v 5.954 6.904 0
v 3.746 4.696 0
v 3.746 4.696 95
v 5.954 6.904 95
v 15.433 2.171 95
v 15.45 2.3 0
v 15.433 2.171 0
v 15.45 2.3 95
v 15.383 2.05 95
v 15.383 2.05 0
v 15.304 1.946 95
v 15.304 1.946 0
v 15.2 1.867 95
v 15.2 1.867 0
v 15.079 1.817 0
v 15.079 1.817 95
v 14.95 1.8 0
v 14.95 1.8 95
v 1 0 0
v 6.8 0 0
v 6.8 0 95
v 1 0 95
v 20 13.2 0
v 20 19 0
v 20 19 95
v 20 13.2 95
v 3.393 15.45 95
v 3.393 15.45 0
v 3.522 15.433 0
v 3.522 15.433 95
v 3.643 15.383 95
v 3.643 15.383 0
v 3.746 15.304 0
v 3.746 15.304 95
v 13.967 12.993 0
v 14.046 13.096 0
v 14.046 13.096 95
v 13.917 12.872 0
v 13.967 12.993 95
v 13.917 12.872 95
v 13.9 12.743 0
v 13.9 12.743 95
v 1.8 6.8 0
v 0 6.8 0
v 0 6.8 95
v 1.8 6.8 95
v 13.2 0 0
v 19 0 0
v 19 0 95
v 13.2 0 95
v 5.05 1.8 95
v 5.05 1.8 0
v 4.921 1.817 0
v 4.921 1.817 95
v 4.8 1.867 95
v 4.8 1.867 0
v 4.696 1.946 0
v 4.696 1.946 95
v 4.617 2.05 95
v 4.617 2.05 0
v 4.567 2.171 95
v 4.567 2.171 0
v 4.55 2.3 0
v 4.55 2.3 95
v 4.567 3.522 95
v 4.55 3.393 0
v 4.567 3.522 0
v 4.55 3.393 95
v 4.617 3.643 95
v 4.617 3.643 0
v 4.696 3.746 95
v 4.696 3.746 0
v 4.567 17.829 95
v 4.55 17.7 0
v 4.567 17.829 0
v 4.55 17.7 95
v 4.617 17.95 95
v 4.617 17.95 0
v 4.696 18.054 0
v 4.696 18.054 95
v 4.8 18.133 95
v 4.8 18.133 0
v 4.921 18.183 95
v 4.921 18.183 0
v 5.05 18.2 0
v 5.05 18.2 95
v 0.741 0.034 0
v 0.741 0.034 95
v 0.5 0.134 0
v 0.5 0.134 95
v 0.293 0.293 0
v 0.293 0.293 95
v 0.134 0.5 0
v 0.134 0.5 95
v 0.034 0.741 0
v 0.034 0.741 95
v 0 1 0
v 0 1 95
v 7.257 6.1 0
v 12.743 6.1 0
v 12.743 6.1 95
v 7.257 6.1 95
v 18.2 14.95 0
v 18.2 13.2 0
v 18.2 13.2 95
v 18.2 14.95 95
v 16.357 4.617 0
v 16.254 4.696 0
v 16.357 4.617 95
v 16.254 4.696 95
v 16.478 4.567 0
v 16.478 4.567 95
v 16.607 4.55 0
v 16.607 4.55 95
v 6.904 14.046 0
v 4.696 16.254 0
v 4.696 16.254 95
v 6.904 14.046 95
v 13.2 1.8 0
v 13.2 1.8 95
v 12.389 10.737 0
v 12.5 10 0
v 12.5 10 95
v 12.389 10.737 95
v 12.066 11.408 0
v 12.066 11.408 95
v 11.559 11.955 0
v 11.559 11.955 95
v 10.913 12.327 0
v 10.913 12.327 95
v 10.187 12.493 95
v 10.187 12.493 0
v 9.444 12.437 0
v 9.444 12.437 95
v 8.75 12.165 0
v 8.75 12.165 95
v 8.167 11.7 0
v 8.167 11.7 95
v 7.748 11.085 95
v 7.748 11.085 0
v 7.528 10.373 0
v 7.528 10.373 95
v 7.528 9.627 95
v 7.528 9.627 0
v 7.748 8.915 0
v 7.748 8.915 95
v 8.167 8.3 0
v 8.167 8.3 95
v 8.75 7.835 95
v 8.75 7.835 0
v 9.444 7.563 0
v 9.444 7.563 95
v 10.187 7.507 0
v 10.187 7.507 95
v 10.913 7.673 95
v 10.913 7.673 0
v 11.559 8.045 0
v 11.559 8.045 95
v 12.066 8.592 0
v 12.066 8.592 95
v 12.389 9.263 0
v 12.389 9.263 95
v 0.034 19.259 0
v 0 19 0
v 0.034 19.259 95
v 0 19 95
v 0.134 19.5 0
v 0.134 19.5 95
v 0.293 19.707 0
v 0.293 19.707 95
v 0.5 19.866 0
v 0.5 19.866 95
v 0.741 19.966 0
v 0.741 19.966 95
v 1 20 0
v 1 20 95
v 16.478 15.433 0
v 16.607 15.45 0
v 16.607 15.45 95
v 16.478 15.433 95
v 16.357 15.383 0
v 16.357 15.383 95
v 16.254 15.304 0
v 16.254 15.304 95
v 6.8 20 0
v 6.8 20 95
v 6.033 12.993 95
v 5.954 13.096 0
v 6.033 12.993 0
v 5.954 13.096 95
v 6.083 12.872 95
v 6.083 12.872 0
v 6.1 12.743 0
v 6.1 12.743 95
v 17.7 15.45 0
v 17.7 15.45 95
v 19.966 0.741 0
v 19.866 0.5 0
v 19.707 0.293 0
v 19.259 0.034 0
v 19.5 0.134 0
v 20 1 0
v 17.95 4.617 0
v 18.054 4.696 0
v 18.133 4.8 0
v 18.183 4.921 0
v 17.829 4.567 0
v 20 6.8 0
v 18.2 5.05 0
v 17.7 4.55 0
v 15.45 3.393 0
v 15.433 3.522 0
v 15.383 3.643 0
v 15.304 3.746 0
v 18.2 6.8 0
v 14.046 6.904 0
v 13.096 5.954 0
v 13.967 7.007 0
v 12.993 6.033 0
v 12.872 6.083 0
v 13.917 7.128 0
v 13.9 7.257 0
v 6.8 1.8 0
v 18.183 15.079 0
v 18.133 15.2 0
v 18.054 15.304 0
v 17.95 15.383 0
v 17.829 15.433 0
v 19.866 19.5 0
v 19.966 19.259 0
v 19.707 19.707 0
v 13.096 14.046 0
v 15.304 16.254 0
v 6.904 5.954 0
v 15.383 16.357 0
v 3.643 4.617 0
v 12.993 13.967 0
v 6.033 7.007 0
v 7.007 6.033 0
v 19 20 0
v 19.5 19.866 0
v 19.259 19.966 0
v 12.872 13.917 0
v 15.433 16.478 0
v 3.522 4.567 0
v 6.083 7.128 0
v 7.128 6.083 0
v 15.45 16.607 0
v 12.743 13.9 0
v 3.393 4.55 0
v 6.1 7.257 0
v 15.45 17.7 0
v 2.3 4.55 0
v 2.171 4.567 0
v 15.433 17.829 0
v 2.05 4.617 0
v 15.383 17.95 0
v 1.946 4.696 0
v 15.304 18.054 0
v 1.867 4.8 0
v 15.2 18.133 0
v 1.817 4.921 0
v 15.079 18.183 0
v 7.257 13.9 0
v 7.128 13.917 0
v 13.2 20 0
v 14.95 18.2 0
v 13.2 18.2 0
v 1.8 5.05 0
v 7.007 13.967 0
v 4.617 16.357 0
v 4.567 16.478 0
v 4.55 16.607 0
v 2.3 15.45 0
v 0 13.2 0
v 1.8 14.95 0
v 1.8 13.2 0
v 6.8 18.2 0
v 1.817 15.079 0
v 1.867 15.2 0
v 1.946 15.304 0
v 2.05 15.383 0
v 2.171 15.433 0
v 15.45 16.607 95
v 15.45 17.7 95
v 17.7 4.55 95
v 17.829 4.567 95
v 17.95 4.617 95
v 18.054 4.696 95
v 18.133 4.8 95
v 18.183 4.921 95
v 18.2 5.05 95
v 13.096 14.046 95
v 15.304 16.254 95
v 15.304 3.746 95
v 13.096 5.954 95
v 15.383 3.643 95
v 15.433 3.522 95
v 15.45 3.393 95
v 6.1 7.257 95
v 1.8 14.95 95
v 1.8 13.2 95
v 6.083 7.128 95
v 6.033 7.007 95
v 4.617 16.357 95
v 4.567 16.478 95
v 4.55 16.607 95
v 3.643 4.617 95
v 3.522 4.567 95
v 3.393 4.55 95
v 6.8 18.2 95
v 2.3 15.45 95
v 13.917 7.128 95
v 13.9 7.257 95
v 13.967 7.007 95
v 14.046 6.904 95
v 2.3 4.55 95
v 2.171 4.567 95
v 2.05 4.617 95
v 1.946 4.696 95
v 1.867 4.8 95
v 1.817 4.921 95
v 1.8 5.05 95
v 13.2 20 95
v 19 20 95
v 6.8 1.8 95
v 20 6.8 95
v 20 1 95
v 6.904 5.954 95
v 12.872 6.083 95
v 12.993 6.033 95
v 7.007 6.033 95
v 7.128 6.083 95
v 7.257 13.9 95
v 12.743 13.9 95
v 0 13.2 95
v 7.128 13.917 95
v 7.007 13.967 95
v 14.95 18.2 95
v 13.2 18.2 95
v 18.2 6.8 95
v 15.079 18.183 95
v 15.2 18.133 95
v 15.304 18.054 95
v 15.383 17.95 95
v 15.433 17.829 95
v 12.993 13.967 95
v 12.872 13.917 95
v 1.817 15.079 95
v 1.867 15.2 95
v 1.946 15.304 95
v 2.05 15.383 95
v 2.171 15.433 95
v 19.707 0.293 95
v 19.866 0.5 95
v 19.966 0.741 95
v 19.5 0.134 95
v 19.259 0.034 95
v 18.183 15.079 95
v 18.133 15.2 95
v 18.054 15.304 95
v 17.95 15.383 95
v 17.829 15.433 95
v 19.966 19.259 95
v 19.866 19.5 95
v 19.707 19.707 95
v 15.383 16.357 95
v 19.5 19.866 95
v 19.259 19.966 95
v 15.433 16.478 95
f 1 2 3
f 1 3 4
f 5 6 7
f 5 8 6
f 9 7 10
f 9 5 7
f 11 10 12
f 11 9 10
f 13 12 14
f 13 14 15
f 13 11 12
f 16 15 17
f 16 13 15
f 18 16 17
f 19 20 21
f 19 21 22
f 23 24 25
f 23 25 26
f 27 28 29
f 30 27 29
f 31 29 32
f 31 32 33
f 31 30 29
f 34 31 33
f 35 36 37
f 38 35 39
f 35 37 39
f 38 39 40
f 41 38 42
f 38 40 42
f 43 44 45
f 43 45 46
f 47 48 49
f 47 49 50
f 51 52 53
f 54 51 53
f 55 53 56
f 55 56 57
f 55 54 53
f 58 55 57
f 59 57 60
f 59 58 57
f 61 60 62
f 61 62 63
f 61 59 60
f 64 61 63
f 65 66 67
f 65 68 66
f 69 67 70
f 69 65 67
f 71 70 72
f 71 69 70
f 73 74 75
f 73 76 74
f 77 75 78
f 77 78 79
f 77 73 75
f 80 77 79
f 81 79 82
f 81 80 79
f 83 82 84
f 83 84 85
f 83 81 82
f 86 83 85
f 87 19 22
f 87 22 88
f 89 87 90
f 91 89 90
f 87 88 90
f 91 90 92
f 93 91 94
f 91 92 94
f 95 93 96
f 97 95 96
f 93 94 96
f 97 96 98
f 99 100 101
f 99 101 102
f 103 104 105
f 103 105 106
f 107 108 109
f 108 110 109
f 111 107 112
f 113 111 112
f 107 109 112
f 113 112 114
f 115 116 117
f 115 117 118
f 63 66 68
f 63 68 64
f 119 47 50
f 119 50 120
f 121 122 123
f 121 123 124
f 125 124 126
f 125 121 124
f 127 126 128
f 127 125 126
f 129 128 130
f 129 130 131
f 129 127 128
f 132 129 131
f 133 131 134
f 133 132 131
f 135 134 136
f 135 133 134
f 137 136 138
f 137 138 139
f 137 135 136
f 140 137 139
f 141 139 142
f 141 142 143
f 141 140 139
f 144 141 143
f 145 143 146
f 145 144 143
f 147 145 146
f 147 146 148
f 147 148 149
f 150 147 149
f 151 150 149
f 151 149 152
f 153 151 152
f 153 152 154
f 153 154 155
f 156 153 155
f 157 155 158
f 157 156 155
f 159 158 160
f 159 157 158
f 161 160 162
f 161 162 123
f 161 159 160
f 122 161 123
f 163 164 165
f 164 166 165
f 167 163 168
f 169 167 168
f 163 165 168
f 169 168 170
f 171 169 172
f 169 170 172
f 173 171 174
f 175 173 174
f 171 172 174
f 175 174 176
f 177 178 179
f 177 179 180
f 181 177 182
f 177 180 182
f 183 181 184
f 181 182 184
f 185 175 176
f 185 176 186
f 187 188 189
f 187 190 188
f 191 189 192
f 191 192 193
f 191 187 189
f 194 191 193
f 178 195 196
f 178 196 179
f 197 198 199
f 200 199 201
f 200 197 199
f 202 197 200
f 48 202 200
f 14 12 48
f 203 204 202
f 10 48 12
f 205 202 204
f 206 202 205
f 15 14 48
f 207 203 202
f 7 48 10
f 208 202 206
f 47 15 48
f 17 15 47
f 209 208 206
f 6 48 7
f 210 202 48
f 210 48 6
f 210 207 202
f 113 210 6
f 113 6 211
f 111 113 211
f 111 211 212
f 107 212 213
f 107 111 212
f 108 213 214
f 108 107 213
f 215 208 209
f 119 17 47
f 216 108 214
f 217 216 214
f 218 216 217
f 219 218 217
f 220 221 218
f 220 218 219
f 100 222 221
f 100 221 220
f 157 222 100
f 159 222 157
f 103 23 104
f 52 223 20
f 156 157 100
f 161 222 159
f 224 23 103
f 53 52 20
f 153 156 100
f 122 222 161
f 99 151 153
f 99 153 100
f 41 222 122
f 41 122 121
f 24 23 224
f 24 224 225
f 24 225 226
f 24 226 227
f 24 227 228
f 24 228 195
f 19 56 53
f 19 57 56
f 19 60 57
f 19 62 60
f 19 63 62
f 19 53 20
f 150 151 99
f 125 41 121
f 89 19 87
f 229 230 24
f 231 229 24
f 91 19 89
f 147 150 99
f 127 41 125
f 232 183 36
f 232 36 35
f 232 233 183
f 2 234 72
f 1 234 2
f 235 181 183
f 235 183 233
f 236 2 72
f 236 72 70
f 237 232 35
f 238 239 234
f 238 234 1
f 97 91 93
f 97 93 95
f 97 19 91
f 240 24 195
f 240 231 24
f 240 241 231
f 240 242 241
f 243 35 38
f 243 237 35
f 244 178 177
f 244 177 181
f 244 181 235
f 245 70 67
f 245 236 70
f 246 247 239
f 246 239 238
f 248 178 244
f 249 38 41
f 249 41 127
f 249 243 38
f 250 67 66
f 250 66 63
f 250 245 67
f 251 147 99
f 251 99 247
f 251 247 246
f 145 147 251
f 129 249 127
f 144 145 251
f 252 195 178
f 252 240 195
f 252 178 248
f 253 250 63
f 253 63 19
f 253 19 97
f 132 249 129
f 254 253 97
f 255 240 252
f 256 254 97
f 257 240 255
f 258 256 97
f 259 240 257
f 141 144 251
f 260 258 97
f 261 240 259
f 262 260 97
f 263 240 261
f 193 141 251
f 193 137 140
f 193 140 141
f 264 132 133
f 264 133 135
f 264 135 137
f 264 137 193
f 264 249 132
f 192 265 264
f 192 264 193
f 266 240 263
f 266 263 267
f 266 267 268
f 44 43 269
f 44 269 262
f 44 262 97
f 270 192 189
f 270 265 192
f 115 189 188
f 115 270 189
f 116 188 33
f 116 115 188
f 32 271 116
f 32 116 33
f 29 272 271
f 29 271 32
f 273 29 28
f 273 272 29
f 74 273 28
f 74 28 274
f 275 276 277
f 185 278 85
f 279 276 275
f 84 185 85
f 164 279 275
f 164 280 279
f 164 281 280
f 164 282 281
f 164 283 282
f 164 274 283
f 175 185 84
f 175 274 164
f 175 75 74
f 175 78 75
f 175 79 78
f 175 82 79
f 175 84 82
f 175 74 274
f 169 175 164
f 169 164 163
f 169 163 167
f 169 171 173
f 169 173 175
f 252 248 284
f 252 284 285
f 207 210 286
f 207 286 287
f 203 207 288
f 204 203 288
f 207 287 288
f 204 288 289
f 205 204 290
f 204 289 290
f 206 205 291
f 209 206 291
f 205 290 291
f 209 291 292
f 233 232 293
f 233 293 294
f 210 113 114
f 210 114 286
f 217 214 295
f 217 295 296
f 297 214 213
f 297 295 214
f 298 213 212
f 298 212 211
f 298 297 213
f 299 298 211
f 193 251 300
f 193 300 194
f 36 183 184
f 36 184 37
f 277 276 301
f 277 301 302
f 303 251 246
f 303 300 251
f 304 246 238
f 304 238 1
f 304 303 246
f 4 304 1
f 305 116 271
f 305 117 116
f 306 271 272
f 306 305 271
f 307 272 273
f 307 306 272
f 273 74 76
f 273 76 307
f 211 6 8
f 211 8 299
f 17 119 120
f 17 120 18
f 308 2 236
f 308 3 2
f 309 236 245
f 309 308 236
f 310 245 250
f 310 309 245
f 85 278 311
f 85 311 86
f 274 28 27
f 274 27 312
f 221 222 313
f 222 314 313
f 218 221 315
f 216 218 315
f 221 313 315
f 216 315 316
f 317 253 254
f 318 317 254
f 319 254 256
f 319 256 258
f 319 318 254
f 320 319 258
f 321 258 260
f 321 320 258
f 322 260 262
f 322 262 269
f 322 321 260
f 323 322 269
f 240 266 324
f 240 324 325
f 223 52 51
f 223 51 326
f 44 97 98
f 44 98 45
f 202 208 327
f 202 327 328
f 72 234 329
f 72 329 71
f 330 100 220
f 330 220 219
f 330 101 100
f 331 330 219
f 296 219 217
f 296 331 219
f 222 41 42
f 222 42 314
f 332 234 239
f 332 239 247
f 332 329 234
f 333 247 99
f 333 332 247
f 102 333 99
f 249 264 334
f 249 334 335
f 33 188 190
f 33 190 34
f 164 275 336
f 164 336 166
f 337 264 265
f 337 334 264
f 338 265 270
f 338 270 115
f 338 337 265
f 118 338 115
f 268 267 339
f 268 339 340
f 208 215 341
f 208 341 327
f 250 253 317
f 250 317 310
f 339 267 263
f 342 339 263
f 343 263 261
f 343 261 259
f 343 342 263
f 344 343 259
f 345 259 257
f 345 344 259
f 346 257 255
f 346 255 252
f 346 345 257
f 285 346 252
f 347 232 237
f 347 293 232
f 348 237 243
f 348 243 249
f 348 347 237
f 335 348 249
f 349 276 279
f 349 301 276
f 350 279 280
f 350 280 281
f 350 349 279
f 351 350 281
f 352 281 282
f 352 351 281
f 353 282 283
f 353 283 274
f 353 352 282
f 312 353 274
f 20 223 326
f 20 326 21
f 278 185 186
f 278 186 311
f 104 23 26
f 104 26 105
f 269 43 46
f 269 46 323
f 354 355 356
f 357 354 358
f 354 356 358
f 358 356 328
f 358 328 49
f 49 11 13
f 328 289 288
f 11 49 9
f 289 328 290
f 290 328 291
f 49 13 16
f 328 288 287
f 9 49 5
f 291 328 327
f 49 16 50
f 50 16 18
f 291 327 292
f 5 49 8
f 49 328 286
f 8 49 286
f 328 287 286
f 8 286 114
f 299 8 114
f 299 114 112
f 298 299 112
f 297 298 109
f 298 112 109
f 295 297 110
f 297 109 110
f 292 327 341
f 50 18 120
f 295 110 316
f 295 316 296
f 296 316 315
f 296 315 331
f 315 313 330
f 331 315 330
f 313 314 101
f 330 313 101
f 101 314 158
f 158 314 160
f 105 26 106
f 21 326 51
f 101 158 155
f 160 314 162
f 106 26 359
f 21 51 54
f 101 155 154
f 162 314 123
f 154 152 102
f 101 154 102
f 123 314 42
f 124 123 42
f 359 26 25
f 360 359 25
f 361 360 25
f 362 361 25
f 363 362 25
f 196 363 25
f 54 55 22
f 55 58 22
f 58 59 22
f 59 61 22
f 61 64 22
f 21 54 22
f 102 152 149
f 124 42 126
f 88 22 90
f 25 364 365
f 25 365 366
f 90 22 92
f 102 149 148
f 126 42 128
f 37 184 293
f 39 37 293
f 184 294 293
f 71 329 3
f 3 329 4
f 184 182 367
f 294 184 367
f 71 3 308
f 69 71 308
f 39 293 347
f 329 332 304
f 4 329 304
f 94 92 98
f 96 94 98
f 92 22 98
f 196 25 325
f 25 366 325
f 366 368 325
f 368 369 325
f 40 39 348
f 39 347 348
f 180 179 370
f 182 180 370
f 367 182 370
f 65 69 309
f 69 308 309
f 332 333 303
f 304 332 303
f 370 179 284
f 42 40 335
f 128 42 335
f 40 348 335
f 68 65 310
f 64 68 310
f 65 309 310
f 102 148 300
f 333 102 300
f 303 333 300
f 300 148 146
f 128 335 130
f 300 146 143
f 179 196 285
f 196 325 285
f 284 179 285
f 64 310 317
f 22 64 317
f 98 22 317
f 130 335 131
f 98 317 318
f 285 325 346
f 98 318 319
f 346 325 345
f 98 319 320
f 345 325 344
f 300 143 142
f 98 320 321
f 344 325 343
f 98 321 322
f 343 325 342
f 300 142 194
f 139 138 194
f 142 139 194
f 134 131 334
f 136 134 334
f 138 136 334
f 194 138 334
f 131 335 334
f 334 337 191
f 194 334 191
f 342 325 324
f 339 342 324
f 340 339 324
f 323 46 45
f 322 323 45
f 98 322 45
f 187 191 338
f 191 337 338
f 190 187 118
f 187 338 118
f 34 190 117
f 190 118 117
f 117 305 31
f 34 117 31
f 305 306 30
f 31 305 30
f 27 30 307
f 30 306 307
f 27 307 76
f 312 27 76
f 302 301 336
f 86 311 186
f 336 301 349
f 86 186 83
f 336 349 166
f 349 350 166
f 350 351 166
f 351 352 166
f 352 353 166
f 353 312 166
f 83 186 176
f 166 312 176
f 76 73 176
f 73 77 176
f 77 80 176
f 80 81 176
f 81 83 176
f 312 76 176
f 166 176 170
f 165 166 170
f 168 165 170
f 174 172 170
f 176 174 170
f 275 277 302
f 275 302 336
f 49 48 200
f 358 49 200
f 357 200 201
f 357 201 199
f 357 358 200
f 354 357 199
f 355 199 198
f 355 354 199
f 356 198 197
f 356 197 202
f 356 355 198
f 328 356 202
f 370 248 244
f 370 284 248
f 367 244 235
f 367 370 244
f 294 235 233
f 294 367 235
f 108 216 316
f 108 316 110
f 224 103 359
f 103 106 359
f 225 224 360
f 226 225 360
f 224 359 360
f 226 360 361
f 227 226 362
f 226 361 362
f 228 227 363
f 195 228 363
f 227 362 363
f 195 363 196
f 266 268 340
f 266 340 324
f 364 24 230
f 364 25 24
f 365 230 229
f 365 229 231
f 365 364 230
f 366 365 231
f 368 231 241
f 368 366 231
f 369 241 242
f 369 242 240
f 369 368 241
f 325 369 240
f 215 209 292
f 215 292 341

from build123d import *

# Parameters (mm, degrees)
SKETCH1_R           = 2.5
BOSS_EXTRUDE1_DEPTH = 95
FILLET1_R           = 1
FILLET2_R           = 0.5
FILLET3_R           = 0.5
FILLET4_R           = 0.5
FILLET5_R           = 0.5


with BuildPart() as part:
    # Sketch1 → Boss-Extrude1 (new body)
    with BuildSketch(Plane.XY):
        Polygon((13.2, 0), (13.2, 1.8), (15.45, 1.8), (15.45, 3.6), (12.95, 6.1), (7.05, 6.1), (4.55, 3.6), (4.55, 1.8), (6.8, 1.8), (6.8, 0), (0, 0), (0, 6.8), (1.8, 6.8), (1.8, 4.55), (3.6, 4.55), (6.1, 7.05), (6.1, 12.95), (3.6, 15.45), (1.8, 15.45), (1.8, 13.2), (0, 13.2), (0, 20), (6.8, 20), (6.8, 18.2), (4.55, 18.2), (4.55, 16.4), (7.05, 13.9), (12.95, 13.9), (15.45, 16.4), (15.45, 18.2), (13.2, 18.2), (13.2, 20), (20, 20), (20, 13.2), (18.2, 13.2), (18.2, 15.45), (16.4, 15.45), (13.9, 12.95), (13.9, 7.05), (16.4, 4.55), (18.2, 4.55), (18.2, 6.8), (20, 6.8), (20, 0), align=None)
        with Locations((10, 10)):
            Circle(SKETCH1_R, mode=Mode.SUBTRACT)
    extrude(amount=BOSS_EXTRUDE1_DEPTH)

    # Fillet1
    fillet1_edges = [part.edges().sort_by_distance(p)[0] for p in [
        (0, 0, 47.5),
        (0, 20, 47.5),
        (20, 20, 47.5),
        (20, 0, 47.5),
    ]]
    fillet(fillet1_edges, radius=FILLET1_R)

    # Fillet2
    fillet2_edges = [part.edges().sort_by_distance(p)[0] for p in [
        (4.55, 18.2, 47.5),
        (4.55, 16.4, 47.5),
        (7.05, 13.9, 47.5),
        (12.95, 13.9, 47.5),
        (15.45, 16.4, 47.5),
        (15.45, 18.2, 47.5),
    ]]
    fillet(fillet2_edges, radius=FILLET2_R)

    # Fillet3
    fillet3_edges = [part.edges().sort_by_distance(p)[0] for p in [
        (18.2, 15.45, 47.5),
        (16.4, 15.45, 47.5),
        (13.9, 12.95, 47.5),
        (13.9, 7.05, 47.5),
        (16.4, 4.55, 47.5),
        (18.2, 4.55, 47.5),
    ]]
    fillet(fillet3_edges, radius=FILLET3_R)

    # Fillet4
    fillet4_edges = [part.edges().sort_by_distance(p)[0] for p in [
        (1.8, 4.55, 47.5),
        (3.6, 4.55, 47.5),
        (6.1, 7.05, 47.5),
        (6.1, 12.95, 47.5),
        (3.6, 15.45, 47.5),
        (1.8, 15.45, 47.5),
    ]]
    fillet(fillet4_edges, radius=FILLET4_R)

    # Fillet5
    fillet5_edges = [part.edges().sort_by_distance(p)[0] for p in [
        (15.45, 1.8, 47.5),
        (15.45, 3.6, 47.5),
        (12.95, 6.1, 47.5),
        (7.05, 6.1, 47.5),
        (4.55, 3.6, 47.5),
        (4.55, 1.8, 47.5),
    ]]
    fillet(fillet5_edges, radius=FILLET5_R)


solid = part.part
